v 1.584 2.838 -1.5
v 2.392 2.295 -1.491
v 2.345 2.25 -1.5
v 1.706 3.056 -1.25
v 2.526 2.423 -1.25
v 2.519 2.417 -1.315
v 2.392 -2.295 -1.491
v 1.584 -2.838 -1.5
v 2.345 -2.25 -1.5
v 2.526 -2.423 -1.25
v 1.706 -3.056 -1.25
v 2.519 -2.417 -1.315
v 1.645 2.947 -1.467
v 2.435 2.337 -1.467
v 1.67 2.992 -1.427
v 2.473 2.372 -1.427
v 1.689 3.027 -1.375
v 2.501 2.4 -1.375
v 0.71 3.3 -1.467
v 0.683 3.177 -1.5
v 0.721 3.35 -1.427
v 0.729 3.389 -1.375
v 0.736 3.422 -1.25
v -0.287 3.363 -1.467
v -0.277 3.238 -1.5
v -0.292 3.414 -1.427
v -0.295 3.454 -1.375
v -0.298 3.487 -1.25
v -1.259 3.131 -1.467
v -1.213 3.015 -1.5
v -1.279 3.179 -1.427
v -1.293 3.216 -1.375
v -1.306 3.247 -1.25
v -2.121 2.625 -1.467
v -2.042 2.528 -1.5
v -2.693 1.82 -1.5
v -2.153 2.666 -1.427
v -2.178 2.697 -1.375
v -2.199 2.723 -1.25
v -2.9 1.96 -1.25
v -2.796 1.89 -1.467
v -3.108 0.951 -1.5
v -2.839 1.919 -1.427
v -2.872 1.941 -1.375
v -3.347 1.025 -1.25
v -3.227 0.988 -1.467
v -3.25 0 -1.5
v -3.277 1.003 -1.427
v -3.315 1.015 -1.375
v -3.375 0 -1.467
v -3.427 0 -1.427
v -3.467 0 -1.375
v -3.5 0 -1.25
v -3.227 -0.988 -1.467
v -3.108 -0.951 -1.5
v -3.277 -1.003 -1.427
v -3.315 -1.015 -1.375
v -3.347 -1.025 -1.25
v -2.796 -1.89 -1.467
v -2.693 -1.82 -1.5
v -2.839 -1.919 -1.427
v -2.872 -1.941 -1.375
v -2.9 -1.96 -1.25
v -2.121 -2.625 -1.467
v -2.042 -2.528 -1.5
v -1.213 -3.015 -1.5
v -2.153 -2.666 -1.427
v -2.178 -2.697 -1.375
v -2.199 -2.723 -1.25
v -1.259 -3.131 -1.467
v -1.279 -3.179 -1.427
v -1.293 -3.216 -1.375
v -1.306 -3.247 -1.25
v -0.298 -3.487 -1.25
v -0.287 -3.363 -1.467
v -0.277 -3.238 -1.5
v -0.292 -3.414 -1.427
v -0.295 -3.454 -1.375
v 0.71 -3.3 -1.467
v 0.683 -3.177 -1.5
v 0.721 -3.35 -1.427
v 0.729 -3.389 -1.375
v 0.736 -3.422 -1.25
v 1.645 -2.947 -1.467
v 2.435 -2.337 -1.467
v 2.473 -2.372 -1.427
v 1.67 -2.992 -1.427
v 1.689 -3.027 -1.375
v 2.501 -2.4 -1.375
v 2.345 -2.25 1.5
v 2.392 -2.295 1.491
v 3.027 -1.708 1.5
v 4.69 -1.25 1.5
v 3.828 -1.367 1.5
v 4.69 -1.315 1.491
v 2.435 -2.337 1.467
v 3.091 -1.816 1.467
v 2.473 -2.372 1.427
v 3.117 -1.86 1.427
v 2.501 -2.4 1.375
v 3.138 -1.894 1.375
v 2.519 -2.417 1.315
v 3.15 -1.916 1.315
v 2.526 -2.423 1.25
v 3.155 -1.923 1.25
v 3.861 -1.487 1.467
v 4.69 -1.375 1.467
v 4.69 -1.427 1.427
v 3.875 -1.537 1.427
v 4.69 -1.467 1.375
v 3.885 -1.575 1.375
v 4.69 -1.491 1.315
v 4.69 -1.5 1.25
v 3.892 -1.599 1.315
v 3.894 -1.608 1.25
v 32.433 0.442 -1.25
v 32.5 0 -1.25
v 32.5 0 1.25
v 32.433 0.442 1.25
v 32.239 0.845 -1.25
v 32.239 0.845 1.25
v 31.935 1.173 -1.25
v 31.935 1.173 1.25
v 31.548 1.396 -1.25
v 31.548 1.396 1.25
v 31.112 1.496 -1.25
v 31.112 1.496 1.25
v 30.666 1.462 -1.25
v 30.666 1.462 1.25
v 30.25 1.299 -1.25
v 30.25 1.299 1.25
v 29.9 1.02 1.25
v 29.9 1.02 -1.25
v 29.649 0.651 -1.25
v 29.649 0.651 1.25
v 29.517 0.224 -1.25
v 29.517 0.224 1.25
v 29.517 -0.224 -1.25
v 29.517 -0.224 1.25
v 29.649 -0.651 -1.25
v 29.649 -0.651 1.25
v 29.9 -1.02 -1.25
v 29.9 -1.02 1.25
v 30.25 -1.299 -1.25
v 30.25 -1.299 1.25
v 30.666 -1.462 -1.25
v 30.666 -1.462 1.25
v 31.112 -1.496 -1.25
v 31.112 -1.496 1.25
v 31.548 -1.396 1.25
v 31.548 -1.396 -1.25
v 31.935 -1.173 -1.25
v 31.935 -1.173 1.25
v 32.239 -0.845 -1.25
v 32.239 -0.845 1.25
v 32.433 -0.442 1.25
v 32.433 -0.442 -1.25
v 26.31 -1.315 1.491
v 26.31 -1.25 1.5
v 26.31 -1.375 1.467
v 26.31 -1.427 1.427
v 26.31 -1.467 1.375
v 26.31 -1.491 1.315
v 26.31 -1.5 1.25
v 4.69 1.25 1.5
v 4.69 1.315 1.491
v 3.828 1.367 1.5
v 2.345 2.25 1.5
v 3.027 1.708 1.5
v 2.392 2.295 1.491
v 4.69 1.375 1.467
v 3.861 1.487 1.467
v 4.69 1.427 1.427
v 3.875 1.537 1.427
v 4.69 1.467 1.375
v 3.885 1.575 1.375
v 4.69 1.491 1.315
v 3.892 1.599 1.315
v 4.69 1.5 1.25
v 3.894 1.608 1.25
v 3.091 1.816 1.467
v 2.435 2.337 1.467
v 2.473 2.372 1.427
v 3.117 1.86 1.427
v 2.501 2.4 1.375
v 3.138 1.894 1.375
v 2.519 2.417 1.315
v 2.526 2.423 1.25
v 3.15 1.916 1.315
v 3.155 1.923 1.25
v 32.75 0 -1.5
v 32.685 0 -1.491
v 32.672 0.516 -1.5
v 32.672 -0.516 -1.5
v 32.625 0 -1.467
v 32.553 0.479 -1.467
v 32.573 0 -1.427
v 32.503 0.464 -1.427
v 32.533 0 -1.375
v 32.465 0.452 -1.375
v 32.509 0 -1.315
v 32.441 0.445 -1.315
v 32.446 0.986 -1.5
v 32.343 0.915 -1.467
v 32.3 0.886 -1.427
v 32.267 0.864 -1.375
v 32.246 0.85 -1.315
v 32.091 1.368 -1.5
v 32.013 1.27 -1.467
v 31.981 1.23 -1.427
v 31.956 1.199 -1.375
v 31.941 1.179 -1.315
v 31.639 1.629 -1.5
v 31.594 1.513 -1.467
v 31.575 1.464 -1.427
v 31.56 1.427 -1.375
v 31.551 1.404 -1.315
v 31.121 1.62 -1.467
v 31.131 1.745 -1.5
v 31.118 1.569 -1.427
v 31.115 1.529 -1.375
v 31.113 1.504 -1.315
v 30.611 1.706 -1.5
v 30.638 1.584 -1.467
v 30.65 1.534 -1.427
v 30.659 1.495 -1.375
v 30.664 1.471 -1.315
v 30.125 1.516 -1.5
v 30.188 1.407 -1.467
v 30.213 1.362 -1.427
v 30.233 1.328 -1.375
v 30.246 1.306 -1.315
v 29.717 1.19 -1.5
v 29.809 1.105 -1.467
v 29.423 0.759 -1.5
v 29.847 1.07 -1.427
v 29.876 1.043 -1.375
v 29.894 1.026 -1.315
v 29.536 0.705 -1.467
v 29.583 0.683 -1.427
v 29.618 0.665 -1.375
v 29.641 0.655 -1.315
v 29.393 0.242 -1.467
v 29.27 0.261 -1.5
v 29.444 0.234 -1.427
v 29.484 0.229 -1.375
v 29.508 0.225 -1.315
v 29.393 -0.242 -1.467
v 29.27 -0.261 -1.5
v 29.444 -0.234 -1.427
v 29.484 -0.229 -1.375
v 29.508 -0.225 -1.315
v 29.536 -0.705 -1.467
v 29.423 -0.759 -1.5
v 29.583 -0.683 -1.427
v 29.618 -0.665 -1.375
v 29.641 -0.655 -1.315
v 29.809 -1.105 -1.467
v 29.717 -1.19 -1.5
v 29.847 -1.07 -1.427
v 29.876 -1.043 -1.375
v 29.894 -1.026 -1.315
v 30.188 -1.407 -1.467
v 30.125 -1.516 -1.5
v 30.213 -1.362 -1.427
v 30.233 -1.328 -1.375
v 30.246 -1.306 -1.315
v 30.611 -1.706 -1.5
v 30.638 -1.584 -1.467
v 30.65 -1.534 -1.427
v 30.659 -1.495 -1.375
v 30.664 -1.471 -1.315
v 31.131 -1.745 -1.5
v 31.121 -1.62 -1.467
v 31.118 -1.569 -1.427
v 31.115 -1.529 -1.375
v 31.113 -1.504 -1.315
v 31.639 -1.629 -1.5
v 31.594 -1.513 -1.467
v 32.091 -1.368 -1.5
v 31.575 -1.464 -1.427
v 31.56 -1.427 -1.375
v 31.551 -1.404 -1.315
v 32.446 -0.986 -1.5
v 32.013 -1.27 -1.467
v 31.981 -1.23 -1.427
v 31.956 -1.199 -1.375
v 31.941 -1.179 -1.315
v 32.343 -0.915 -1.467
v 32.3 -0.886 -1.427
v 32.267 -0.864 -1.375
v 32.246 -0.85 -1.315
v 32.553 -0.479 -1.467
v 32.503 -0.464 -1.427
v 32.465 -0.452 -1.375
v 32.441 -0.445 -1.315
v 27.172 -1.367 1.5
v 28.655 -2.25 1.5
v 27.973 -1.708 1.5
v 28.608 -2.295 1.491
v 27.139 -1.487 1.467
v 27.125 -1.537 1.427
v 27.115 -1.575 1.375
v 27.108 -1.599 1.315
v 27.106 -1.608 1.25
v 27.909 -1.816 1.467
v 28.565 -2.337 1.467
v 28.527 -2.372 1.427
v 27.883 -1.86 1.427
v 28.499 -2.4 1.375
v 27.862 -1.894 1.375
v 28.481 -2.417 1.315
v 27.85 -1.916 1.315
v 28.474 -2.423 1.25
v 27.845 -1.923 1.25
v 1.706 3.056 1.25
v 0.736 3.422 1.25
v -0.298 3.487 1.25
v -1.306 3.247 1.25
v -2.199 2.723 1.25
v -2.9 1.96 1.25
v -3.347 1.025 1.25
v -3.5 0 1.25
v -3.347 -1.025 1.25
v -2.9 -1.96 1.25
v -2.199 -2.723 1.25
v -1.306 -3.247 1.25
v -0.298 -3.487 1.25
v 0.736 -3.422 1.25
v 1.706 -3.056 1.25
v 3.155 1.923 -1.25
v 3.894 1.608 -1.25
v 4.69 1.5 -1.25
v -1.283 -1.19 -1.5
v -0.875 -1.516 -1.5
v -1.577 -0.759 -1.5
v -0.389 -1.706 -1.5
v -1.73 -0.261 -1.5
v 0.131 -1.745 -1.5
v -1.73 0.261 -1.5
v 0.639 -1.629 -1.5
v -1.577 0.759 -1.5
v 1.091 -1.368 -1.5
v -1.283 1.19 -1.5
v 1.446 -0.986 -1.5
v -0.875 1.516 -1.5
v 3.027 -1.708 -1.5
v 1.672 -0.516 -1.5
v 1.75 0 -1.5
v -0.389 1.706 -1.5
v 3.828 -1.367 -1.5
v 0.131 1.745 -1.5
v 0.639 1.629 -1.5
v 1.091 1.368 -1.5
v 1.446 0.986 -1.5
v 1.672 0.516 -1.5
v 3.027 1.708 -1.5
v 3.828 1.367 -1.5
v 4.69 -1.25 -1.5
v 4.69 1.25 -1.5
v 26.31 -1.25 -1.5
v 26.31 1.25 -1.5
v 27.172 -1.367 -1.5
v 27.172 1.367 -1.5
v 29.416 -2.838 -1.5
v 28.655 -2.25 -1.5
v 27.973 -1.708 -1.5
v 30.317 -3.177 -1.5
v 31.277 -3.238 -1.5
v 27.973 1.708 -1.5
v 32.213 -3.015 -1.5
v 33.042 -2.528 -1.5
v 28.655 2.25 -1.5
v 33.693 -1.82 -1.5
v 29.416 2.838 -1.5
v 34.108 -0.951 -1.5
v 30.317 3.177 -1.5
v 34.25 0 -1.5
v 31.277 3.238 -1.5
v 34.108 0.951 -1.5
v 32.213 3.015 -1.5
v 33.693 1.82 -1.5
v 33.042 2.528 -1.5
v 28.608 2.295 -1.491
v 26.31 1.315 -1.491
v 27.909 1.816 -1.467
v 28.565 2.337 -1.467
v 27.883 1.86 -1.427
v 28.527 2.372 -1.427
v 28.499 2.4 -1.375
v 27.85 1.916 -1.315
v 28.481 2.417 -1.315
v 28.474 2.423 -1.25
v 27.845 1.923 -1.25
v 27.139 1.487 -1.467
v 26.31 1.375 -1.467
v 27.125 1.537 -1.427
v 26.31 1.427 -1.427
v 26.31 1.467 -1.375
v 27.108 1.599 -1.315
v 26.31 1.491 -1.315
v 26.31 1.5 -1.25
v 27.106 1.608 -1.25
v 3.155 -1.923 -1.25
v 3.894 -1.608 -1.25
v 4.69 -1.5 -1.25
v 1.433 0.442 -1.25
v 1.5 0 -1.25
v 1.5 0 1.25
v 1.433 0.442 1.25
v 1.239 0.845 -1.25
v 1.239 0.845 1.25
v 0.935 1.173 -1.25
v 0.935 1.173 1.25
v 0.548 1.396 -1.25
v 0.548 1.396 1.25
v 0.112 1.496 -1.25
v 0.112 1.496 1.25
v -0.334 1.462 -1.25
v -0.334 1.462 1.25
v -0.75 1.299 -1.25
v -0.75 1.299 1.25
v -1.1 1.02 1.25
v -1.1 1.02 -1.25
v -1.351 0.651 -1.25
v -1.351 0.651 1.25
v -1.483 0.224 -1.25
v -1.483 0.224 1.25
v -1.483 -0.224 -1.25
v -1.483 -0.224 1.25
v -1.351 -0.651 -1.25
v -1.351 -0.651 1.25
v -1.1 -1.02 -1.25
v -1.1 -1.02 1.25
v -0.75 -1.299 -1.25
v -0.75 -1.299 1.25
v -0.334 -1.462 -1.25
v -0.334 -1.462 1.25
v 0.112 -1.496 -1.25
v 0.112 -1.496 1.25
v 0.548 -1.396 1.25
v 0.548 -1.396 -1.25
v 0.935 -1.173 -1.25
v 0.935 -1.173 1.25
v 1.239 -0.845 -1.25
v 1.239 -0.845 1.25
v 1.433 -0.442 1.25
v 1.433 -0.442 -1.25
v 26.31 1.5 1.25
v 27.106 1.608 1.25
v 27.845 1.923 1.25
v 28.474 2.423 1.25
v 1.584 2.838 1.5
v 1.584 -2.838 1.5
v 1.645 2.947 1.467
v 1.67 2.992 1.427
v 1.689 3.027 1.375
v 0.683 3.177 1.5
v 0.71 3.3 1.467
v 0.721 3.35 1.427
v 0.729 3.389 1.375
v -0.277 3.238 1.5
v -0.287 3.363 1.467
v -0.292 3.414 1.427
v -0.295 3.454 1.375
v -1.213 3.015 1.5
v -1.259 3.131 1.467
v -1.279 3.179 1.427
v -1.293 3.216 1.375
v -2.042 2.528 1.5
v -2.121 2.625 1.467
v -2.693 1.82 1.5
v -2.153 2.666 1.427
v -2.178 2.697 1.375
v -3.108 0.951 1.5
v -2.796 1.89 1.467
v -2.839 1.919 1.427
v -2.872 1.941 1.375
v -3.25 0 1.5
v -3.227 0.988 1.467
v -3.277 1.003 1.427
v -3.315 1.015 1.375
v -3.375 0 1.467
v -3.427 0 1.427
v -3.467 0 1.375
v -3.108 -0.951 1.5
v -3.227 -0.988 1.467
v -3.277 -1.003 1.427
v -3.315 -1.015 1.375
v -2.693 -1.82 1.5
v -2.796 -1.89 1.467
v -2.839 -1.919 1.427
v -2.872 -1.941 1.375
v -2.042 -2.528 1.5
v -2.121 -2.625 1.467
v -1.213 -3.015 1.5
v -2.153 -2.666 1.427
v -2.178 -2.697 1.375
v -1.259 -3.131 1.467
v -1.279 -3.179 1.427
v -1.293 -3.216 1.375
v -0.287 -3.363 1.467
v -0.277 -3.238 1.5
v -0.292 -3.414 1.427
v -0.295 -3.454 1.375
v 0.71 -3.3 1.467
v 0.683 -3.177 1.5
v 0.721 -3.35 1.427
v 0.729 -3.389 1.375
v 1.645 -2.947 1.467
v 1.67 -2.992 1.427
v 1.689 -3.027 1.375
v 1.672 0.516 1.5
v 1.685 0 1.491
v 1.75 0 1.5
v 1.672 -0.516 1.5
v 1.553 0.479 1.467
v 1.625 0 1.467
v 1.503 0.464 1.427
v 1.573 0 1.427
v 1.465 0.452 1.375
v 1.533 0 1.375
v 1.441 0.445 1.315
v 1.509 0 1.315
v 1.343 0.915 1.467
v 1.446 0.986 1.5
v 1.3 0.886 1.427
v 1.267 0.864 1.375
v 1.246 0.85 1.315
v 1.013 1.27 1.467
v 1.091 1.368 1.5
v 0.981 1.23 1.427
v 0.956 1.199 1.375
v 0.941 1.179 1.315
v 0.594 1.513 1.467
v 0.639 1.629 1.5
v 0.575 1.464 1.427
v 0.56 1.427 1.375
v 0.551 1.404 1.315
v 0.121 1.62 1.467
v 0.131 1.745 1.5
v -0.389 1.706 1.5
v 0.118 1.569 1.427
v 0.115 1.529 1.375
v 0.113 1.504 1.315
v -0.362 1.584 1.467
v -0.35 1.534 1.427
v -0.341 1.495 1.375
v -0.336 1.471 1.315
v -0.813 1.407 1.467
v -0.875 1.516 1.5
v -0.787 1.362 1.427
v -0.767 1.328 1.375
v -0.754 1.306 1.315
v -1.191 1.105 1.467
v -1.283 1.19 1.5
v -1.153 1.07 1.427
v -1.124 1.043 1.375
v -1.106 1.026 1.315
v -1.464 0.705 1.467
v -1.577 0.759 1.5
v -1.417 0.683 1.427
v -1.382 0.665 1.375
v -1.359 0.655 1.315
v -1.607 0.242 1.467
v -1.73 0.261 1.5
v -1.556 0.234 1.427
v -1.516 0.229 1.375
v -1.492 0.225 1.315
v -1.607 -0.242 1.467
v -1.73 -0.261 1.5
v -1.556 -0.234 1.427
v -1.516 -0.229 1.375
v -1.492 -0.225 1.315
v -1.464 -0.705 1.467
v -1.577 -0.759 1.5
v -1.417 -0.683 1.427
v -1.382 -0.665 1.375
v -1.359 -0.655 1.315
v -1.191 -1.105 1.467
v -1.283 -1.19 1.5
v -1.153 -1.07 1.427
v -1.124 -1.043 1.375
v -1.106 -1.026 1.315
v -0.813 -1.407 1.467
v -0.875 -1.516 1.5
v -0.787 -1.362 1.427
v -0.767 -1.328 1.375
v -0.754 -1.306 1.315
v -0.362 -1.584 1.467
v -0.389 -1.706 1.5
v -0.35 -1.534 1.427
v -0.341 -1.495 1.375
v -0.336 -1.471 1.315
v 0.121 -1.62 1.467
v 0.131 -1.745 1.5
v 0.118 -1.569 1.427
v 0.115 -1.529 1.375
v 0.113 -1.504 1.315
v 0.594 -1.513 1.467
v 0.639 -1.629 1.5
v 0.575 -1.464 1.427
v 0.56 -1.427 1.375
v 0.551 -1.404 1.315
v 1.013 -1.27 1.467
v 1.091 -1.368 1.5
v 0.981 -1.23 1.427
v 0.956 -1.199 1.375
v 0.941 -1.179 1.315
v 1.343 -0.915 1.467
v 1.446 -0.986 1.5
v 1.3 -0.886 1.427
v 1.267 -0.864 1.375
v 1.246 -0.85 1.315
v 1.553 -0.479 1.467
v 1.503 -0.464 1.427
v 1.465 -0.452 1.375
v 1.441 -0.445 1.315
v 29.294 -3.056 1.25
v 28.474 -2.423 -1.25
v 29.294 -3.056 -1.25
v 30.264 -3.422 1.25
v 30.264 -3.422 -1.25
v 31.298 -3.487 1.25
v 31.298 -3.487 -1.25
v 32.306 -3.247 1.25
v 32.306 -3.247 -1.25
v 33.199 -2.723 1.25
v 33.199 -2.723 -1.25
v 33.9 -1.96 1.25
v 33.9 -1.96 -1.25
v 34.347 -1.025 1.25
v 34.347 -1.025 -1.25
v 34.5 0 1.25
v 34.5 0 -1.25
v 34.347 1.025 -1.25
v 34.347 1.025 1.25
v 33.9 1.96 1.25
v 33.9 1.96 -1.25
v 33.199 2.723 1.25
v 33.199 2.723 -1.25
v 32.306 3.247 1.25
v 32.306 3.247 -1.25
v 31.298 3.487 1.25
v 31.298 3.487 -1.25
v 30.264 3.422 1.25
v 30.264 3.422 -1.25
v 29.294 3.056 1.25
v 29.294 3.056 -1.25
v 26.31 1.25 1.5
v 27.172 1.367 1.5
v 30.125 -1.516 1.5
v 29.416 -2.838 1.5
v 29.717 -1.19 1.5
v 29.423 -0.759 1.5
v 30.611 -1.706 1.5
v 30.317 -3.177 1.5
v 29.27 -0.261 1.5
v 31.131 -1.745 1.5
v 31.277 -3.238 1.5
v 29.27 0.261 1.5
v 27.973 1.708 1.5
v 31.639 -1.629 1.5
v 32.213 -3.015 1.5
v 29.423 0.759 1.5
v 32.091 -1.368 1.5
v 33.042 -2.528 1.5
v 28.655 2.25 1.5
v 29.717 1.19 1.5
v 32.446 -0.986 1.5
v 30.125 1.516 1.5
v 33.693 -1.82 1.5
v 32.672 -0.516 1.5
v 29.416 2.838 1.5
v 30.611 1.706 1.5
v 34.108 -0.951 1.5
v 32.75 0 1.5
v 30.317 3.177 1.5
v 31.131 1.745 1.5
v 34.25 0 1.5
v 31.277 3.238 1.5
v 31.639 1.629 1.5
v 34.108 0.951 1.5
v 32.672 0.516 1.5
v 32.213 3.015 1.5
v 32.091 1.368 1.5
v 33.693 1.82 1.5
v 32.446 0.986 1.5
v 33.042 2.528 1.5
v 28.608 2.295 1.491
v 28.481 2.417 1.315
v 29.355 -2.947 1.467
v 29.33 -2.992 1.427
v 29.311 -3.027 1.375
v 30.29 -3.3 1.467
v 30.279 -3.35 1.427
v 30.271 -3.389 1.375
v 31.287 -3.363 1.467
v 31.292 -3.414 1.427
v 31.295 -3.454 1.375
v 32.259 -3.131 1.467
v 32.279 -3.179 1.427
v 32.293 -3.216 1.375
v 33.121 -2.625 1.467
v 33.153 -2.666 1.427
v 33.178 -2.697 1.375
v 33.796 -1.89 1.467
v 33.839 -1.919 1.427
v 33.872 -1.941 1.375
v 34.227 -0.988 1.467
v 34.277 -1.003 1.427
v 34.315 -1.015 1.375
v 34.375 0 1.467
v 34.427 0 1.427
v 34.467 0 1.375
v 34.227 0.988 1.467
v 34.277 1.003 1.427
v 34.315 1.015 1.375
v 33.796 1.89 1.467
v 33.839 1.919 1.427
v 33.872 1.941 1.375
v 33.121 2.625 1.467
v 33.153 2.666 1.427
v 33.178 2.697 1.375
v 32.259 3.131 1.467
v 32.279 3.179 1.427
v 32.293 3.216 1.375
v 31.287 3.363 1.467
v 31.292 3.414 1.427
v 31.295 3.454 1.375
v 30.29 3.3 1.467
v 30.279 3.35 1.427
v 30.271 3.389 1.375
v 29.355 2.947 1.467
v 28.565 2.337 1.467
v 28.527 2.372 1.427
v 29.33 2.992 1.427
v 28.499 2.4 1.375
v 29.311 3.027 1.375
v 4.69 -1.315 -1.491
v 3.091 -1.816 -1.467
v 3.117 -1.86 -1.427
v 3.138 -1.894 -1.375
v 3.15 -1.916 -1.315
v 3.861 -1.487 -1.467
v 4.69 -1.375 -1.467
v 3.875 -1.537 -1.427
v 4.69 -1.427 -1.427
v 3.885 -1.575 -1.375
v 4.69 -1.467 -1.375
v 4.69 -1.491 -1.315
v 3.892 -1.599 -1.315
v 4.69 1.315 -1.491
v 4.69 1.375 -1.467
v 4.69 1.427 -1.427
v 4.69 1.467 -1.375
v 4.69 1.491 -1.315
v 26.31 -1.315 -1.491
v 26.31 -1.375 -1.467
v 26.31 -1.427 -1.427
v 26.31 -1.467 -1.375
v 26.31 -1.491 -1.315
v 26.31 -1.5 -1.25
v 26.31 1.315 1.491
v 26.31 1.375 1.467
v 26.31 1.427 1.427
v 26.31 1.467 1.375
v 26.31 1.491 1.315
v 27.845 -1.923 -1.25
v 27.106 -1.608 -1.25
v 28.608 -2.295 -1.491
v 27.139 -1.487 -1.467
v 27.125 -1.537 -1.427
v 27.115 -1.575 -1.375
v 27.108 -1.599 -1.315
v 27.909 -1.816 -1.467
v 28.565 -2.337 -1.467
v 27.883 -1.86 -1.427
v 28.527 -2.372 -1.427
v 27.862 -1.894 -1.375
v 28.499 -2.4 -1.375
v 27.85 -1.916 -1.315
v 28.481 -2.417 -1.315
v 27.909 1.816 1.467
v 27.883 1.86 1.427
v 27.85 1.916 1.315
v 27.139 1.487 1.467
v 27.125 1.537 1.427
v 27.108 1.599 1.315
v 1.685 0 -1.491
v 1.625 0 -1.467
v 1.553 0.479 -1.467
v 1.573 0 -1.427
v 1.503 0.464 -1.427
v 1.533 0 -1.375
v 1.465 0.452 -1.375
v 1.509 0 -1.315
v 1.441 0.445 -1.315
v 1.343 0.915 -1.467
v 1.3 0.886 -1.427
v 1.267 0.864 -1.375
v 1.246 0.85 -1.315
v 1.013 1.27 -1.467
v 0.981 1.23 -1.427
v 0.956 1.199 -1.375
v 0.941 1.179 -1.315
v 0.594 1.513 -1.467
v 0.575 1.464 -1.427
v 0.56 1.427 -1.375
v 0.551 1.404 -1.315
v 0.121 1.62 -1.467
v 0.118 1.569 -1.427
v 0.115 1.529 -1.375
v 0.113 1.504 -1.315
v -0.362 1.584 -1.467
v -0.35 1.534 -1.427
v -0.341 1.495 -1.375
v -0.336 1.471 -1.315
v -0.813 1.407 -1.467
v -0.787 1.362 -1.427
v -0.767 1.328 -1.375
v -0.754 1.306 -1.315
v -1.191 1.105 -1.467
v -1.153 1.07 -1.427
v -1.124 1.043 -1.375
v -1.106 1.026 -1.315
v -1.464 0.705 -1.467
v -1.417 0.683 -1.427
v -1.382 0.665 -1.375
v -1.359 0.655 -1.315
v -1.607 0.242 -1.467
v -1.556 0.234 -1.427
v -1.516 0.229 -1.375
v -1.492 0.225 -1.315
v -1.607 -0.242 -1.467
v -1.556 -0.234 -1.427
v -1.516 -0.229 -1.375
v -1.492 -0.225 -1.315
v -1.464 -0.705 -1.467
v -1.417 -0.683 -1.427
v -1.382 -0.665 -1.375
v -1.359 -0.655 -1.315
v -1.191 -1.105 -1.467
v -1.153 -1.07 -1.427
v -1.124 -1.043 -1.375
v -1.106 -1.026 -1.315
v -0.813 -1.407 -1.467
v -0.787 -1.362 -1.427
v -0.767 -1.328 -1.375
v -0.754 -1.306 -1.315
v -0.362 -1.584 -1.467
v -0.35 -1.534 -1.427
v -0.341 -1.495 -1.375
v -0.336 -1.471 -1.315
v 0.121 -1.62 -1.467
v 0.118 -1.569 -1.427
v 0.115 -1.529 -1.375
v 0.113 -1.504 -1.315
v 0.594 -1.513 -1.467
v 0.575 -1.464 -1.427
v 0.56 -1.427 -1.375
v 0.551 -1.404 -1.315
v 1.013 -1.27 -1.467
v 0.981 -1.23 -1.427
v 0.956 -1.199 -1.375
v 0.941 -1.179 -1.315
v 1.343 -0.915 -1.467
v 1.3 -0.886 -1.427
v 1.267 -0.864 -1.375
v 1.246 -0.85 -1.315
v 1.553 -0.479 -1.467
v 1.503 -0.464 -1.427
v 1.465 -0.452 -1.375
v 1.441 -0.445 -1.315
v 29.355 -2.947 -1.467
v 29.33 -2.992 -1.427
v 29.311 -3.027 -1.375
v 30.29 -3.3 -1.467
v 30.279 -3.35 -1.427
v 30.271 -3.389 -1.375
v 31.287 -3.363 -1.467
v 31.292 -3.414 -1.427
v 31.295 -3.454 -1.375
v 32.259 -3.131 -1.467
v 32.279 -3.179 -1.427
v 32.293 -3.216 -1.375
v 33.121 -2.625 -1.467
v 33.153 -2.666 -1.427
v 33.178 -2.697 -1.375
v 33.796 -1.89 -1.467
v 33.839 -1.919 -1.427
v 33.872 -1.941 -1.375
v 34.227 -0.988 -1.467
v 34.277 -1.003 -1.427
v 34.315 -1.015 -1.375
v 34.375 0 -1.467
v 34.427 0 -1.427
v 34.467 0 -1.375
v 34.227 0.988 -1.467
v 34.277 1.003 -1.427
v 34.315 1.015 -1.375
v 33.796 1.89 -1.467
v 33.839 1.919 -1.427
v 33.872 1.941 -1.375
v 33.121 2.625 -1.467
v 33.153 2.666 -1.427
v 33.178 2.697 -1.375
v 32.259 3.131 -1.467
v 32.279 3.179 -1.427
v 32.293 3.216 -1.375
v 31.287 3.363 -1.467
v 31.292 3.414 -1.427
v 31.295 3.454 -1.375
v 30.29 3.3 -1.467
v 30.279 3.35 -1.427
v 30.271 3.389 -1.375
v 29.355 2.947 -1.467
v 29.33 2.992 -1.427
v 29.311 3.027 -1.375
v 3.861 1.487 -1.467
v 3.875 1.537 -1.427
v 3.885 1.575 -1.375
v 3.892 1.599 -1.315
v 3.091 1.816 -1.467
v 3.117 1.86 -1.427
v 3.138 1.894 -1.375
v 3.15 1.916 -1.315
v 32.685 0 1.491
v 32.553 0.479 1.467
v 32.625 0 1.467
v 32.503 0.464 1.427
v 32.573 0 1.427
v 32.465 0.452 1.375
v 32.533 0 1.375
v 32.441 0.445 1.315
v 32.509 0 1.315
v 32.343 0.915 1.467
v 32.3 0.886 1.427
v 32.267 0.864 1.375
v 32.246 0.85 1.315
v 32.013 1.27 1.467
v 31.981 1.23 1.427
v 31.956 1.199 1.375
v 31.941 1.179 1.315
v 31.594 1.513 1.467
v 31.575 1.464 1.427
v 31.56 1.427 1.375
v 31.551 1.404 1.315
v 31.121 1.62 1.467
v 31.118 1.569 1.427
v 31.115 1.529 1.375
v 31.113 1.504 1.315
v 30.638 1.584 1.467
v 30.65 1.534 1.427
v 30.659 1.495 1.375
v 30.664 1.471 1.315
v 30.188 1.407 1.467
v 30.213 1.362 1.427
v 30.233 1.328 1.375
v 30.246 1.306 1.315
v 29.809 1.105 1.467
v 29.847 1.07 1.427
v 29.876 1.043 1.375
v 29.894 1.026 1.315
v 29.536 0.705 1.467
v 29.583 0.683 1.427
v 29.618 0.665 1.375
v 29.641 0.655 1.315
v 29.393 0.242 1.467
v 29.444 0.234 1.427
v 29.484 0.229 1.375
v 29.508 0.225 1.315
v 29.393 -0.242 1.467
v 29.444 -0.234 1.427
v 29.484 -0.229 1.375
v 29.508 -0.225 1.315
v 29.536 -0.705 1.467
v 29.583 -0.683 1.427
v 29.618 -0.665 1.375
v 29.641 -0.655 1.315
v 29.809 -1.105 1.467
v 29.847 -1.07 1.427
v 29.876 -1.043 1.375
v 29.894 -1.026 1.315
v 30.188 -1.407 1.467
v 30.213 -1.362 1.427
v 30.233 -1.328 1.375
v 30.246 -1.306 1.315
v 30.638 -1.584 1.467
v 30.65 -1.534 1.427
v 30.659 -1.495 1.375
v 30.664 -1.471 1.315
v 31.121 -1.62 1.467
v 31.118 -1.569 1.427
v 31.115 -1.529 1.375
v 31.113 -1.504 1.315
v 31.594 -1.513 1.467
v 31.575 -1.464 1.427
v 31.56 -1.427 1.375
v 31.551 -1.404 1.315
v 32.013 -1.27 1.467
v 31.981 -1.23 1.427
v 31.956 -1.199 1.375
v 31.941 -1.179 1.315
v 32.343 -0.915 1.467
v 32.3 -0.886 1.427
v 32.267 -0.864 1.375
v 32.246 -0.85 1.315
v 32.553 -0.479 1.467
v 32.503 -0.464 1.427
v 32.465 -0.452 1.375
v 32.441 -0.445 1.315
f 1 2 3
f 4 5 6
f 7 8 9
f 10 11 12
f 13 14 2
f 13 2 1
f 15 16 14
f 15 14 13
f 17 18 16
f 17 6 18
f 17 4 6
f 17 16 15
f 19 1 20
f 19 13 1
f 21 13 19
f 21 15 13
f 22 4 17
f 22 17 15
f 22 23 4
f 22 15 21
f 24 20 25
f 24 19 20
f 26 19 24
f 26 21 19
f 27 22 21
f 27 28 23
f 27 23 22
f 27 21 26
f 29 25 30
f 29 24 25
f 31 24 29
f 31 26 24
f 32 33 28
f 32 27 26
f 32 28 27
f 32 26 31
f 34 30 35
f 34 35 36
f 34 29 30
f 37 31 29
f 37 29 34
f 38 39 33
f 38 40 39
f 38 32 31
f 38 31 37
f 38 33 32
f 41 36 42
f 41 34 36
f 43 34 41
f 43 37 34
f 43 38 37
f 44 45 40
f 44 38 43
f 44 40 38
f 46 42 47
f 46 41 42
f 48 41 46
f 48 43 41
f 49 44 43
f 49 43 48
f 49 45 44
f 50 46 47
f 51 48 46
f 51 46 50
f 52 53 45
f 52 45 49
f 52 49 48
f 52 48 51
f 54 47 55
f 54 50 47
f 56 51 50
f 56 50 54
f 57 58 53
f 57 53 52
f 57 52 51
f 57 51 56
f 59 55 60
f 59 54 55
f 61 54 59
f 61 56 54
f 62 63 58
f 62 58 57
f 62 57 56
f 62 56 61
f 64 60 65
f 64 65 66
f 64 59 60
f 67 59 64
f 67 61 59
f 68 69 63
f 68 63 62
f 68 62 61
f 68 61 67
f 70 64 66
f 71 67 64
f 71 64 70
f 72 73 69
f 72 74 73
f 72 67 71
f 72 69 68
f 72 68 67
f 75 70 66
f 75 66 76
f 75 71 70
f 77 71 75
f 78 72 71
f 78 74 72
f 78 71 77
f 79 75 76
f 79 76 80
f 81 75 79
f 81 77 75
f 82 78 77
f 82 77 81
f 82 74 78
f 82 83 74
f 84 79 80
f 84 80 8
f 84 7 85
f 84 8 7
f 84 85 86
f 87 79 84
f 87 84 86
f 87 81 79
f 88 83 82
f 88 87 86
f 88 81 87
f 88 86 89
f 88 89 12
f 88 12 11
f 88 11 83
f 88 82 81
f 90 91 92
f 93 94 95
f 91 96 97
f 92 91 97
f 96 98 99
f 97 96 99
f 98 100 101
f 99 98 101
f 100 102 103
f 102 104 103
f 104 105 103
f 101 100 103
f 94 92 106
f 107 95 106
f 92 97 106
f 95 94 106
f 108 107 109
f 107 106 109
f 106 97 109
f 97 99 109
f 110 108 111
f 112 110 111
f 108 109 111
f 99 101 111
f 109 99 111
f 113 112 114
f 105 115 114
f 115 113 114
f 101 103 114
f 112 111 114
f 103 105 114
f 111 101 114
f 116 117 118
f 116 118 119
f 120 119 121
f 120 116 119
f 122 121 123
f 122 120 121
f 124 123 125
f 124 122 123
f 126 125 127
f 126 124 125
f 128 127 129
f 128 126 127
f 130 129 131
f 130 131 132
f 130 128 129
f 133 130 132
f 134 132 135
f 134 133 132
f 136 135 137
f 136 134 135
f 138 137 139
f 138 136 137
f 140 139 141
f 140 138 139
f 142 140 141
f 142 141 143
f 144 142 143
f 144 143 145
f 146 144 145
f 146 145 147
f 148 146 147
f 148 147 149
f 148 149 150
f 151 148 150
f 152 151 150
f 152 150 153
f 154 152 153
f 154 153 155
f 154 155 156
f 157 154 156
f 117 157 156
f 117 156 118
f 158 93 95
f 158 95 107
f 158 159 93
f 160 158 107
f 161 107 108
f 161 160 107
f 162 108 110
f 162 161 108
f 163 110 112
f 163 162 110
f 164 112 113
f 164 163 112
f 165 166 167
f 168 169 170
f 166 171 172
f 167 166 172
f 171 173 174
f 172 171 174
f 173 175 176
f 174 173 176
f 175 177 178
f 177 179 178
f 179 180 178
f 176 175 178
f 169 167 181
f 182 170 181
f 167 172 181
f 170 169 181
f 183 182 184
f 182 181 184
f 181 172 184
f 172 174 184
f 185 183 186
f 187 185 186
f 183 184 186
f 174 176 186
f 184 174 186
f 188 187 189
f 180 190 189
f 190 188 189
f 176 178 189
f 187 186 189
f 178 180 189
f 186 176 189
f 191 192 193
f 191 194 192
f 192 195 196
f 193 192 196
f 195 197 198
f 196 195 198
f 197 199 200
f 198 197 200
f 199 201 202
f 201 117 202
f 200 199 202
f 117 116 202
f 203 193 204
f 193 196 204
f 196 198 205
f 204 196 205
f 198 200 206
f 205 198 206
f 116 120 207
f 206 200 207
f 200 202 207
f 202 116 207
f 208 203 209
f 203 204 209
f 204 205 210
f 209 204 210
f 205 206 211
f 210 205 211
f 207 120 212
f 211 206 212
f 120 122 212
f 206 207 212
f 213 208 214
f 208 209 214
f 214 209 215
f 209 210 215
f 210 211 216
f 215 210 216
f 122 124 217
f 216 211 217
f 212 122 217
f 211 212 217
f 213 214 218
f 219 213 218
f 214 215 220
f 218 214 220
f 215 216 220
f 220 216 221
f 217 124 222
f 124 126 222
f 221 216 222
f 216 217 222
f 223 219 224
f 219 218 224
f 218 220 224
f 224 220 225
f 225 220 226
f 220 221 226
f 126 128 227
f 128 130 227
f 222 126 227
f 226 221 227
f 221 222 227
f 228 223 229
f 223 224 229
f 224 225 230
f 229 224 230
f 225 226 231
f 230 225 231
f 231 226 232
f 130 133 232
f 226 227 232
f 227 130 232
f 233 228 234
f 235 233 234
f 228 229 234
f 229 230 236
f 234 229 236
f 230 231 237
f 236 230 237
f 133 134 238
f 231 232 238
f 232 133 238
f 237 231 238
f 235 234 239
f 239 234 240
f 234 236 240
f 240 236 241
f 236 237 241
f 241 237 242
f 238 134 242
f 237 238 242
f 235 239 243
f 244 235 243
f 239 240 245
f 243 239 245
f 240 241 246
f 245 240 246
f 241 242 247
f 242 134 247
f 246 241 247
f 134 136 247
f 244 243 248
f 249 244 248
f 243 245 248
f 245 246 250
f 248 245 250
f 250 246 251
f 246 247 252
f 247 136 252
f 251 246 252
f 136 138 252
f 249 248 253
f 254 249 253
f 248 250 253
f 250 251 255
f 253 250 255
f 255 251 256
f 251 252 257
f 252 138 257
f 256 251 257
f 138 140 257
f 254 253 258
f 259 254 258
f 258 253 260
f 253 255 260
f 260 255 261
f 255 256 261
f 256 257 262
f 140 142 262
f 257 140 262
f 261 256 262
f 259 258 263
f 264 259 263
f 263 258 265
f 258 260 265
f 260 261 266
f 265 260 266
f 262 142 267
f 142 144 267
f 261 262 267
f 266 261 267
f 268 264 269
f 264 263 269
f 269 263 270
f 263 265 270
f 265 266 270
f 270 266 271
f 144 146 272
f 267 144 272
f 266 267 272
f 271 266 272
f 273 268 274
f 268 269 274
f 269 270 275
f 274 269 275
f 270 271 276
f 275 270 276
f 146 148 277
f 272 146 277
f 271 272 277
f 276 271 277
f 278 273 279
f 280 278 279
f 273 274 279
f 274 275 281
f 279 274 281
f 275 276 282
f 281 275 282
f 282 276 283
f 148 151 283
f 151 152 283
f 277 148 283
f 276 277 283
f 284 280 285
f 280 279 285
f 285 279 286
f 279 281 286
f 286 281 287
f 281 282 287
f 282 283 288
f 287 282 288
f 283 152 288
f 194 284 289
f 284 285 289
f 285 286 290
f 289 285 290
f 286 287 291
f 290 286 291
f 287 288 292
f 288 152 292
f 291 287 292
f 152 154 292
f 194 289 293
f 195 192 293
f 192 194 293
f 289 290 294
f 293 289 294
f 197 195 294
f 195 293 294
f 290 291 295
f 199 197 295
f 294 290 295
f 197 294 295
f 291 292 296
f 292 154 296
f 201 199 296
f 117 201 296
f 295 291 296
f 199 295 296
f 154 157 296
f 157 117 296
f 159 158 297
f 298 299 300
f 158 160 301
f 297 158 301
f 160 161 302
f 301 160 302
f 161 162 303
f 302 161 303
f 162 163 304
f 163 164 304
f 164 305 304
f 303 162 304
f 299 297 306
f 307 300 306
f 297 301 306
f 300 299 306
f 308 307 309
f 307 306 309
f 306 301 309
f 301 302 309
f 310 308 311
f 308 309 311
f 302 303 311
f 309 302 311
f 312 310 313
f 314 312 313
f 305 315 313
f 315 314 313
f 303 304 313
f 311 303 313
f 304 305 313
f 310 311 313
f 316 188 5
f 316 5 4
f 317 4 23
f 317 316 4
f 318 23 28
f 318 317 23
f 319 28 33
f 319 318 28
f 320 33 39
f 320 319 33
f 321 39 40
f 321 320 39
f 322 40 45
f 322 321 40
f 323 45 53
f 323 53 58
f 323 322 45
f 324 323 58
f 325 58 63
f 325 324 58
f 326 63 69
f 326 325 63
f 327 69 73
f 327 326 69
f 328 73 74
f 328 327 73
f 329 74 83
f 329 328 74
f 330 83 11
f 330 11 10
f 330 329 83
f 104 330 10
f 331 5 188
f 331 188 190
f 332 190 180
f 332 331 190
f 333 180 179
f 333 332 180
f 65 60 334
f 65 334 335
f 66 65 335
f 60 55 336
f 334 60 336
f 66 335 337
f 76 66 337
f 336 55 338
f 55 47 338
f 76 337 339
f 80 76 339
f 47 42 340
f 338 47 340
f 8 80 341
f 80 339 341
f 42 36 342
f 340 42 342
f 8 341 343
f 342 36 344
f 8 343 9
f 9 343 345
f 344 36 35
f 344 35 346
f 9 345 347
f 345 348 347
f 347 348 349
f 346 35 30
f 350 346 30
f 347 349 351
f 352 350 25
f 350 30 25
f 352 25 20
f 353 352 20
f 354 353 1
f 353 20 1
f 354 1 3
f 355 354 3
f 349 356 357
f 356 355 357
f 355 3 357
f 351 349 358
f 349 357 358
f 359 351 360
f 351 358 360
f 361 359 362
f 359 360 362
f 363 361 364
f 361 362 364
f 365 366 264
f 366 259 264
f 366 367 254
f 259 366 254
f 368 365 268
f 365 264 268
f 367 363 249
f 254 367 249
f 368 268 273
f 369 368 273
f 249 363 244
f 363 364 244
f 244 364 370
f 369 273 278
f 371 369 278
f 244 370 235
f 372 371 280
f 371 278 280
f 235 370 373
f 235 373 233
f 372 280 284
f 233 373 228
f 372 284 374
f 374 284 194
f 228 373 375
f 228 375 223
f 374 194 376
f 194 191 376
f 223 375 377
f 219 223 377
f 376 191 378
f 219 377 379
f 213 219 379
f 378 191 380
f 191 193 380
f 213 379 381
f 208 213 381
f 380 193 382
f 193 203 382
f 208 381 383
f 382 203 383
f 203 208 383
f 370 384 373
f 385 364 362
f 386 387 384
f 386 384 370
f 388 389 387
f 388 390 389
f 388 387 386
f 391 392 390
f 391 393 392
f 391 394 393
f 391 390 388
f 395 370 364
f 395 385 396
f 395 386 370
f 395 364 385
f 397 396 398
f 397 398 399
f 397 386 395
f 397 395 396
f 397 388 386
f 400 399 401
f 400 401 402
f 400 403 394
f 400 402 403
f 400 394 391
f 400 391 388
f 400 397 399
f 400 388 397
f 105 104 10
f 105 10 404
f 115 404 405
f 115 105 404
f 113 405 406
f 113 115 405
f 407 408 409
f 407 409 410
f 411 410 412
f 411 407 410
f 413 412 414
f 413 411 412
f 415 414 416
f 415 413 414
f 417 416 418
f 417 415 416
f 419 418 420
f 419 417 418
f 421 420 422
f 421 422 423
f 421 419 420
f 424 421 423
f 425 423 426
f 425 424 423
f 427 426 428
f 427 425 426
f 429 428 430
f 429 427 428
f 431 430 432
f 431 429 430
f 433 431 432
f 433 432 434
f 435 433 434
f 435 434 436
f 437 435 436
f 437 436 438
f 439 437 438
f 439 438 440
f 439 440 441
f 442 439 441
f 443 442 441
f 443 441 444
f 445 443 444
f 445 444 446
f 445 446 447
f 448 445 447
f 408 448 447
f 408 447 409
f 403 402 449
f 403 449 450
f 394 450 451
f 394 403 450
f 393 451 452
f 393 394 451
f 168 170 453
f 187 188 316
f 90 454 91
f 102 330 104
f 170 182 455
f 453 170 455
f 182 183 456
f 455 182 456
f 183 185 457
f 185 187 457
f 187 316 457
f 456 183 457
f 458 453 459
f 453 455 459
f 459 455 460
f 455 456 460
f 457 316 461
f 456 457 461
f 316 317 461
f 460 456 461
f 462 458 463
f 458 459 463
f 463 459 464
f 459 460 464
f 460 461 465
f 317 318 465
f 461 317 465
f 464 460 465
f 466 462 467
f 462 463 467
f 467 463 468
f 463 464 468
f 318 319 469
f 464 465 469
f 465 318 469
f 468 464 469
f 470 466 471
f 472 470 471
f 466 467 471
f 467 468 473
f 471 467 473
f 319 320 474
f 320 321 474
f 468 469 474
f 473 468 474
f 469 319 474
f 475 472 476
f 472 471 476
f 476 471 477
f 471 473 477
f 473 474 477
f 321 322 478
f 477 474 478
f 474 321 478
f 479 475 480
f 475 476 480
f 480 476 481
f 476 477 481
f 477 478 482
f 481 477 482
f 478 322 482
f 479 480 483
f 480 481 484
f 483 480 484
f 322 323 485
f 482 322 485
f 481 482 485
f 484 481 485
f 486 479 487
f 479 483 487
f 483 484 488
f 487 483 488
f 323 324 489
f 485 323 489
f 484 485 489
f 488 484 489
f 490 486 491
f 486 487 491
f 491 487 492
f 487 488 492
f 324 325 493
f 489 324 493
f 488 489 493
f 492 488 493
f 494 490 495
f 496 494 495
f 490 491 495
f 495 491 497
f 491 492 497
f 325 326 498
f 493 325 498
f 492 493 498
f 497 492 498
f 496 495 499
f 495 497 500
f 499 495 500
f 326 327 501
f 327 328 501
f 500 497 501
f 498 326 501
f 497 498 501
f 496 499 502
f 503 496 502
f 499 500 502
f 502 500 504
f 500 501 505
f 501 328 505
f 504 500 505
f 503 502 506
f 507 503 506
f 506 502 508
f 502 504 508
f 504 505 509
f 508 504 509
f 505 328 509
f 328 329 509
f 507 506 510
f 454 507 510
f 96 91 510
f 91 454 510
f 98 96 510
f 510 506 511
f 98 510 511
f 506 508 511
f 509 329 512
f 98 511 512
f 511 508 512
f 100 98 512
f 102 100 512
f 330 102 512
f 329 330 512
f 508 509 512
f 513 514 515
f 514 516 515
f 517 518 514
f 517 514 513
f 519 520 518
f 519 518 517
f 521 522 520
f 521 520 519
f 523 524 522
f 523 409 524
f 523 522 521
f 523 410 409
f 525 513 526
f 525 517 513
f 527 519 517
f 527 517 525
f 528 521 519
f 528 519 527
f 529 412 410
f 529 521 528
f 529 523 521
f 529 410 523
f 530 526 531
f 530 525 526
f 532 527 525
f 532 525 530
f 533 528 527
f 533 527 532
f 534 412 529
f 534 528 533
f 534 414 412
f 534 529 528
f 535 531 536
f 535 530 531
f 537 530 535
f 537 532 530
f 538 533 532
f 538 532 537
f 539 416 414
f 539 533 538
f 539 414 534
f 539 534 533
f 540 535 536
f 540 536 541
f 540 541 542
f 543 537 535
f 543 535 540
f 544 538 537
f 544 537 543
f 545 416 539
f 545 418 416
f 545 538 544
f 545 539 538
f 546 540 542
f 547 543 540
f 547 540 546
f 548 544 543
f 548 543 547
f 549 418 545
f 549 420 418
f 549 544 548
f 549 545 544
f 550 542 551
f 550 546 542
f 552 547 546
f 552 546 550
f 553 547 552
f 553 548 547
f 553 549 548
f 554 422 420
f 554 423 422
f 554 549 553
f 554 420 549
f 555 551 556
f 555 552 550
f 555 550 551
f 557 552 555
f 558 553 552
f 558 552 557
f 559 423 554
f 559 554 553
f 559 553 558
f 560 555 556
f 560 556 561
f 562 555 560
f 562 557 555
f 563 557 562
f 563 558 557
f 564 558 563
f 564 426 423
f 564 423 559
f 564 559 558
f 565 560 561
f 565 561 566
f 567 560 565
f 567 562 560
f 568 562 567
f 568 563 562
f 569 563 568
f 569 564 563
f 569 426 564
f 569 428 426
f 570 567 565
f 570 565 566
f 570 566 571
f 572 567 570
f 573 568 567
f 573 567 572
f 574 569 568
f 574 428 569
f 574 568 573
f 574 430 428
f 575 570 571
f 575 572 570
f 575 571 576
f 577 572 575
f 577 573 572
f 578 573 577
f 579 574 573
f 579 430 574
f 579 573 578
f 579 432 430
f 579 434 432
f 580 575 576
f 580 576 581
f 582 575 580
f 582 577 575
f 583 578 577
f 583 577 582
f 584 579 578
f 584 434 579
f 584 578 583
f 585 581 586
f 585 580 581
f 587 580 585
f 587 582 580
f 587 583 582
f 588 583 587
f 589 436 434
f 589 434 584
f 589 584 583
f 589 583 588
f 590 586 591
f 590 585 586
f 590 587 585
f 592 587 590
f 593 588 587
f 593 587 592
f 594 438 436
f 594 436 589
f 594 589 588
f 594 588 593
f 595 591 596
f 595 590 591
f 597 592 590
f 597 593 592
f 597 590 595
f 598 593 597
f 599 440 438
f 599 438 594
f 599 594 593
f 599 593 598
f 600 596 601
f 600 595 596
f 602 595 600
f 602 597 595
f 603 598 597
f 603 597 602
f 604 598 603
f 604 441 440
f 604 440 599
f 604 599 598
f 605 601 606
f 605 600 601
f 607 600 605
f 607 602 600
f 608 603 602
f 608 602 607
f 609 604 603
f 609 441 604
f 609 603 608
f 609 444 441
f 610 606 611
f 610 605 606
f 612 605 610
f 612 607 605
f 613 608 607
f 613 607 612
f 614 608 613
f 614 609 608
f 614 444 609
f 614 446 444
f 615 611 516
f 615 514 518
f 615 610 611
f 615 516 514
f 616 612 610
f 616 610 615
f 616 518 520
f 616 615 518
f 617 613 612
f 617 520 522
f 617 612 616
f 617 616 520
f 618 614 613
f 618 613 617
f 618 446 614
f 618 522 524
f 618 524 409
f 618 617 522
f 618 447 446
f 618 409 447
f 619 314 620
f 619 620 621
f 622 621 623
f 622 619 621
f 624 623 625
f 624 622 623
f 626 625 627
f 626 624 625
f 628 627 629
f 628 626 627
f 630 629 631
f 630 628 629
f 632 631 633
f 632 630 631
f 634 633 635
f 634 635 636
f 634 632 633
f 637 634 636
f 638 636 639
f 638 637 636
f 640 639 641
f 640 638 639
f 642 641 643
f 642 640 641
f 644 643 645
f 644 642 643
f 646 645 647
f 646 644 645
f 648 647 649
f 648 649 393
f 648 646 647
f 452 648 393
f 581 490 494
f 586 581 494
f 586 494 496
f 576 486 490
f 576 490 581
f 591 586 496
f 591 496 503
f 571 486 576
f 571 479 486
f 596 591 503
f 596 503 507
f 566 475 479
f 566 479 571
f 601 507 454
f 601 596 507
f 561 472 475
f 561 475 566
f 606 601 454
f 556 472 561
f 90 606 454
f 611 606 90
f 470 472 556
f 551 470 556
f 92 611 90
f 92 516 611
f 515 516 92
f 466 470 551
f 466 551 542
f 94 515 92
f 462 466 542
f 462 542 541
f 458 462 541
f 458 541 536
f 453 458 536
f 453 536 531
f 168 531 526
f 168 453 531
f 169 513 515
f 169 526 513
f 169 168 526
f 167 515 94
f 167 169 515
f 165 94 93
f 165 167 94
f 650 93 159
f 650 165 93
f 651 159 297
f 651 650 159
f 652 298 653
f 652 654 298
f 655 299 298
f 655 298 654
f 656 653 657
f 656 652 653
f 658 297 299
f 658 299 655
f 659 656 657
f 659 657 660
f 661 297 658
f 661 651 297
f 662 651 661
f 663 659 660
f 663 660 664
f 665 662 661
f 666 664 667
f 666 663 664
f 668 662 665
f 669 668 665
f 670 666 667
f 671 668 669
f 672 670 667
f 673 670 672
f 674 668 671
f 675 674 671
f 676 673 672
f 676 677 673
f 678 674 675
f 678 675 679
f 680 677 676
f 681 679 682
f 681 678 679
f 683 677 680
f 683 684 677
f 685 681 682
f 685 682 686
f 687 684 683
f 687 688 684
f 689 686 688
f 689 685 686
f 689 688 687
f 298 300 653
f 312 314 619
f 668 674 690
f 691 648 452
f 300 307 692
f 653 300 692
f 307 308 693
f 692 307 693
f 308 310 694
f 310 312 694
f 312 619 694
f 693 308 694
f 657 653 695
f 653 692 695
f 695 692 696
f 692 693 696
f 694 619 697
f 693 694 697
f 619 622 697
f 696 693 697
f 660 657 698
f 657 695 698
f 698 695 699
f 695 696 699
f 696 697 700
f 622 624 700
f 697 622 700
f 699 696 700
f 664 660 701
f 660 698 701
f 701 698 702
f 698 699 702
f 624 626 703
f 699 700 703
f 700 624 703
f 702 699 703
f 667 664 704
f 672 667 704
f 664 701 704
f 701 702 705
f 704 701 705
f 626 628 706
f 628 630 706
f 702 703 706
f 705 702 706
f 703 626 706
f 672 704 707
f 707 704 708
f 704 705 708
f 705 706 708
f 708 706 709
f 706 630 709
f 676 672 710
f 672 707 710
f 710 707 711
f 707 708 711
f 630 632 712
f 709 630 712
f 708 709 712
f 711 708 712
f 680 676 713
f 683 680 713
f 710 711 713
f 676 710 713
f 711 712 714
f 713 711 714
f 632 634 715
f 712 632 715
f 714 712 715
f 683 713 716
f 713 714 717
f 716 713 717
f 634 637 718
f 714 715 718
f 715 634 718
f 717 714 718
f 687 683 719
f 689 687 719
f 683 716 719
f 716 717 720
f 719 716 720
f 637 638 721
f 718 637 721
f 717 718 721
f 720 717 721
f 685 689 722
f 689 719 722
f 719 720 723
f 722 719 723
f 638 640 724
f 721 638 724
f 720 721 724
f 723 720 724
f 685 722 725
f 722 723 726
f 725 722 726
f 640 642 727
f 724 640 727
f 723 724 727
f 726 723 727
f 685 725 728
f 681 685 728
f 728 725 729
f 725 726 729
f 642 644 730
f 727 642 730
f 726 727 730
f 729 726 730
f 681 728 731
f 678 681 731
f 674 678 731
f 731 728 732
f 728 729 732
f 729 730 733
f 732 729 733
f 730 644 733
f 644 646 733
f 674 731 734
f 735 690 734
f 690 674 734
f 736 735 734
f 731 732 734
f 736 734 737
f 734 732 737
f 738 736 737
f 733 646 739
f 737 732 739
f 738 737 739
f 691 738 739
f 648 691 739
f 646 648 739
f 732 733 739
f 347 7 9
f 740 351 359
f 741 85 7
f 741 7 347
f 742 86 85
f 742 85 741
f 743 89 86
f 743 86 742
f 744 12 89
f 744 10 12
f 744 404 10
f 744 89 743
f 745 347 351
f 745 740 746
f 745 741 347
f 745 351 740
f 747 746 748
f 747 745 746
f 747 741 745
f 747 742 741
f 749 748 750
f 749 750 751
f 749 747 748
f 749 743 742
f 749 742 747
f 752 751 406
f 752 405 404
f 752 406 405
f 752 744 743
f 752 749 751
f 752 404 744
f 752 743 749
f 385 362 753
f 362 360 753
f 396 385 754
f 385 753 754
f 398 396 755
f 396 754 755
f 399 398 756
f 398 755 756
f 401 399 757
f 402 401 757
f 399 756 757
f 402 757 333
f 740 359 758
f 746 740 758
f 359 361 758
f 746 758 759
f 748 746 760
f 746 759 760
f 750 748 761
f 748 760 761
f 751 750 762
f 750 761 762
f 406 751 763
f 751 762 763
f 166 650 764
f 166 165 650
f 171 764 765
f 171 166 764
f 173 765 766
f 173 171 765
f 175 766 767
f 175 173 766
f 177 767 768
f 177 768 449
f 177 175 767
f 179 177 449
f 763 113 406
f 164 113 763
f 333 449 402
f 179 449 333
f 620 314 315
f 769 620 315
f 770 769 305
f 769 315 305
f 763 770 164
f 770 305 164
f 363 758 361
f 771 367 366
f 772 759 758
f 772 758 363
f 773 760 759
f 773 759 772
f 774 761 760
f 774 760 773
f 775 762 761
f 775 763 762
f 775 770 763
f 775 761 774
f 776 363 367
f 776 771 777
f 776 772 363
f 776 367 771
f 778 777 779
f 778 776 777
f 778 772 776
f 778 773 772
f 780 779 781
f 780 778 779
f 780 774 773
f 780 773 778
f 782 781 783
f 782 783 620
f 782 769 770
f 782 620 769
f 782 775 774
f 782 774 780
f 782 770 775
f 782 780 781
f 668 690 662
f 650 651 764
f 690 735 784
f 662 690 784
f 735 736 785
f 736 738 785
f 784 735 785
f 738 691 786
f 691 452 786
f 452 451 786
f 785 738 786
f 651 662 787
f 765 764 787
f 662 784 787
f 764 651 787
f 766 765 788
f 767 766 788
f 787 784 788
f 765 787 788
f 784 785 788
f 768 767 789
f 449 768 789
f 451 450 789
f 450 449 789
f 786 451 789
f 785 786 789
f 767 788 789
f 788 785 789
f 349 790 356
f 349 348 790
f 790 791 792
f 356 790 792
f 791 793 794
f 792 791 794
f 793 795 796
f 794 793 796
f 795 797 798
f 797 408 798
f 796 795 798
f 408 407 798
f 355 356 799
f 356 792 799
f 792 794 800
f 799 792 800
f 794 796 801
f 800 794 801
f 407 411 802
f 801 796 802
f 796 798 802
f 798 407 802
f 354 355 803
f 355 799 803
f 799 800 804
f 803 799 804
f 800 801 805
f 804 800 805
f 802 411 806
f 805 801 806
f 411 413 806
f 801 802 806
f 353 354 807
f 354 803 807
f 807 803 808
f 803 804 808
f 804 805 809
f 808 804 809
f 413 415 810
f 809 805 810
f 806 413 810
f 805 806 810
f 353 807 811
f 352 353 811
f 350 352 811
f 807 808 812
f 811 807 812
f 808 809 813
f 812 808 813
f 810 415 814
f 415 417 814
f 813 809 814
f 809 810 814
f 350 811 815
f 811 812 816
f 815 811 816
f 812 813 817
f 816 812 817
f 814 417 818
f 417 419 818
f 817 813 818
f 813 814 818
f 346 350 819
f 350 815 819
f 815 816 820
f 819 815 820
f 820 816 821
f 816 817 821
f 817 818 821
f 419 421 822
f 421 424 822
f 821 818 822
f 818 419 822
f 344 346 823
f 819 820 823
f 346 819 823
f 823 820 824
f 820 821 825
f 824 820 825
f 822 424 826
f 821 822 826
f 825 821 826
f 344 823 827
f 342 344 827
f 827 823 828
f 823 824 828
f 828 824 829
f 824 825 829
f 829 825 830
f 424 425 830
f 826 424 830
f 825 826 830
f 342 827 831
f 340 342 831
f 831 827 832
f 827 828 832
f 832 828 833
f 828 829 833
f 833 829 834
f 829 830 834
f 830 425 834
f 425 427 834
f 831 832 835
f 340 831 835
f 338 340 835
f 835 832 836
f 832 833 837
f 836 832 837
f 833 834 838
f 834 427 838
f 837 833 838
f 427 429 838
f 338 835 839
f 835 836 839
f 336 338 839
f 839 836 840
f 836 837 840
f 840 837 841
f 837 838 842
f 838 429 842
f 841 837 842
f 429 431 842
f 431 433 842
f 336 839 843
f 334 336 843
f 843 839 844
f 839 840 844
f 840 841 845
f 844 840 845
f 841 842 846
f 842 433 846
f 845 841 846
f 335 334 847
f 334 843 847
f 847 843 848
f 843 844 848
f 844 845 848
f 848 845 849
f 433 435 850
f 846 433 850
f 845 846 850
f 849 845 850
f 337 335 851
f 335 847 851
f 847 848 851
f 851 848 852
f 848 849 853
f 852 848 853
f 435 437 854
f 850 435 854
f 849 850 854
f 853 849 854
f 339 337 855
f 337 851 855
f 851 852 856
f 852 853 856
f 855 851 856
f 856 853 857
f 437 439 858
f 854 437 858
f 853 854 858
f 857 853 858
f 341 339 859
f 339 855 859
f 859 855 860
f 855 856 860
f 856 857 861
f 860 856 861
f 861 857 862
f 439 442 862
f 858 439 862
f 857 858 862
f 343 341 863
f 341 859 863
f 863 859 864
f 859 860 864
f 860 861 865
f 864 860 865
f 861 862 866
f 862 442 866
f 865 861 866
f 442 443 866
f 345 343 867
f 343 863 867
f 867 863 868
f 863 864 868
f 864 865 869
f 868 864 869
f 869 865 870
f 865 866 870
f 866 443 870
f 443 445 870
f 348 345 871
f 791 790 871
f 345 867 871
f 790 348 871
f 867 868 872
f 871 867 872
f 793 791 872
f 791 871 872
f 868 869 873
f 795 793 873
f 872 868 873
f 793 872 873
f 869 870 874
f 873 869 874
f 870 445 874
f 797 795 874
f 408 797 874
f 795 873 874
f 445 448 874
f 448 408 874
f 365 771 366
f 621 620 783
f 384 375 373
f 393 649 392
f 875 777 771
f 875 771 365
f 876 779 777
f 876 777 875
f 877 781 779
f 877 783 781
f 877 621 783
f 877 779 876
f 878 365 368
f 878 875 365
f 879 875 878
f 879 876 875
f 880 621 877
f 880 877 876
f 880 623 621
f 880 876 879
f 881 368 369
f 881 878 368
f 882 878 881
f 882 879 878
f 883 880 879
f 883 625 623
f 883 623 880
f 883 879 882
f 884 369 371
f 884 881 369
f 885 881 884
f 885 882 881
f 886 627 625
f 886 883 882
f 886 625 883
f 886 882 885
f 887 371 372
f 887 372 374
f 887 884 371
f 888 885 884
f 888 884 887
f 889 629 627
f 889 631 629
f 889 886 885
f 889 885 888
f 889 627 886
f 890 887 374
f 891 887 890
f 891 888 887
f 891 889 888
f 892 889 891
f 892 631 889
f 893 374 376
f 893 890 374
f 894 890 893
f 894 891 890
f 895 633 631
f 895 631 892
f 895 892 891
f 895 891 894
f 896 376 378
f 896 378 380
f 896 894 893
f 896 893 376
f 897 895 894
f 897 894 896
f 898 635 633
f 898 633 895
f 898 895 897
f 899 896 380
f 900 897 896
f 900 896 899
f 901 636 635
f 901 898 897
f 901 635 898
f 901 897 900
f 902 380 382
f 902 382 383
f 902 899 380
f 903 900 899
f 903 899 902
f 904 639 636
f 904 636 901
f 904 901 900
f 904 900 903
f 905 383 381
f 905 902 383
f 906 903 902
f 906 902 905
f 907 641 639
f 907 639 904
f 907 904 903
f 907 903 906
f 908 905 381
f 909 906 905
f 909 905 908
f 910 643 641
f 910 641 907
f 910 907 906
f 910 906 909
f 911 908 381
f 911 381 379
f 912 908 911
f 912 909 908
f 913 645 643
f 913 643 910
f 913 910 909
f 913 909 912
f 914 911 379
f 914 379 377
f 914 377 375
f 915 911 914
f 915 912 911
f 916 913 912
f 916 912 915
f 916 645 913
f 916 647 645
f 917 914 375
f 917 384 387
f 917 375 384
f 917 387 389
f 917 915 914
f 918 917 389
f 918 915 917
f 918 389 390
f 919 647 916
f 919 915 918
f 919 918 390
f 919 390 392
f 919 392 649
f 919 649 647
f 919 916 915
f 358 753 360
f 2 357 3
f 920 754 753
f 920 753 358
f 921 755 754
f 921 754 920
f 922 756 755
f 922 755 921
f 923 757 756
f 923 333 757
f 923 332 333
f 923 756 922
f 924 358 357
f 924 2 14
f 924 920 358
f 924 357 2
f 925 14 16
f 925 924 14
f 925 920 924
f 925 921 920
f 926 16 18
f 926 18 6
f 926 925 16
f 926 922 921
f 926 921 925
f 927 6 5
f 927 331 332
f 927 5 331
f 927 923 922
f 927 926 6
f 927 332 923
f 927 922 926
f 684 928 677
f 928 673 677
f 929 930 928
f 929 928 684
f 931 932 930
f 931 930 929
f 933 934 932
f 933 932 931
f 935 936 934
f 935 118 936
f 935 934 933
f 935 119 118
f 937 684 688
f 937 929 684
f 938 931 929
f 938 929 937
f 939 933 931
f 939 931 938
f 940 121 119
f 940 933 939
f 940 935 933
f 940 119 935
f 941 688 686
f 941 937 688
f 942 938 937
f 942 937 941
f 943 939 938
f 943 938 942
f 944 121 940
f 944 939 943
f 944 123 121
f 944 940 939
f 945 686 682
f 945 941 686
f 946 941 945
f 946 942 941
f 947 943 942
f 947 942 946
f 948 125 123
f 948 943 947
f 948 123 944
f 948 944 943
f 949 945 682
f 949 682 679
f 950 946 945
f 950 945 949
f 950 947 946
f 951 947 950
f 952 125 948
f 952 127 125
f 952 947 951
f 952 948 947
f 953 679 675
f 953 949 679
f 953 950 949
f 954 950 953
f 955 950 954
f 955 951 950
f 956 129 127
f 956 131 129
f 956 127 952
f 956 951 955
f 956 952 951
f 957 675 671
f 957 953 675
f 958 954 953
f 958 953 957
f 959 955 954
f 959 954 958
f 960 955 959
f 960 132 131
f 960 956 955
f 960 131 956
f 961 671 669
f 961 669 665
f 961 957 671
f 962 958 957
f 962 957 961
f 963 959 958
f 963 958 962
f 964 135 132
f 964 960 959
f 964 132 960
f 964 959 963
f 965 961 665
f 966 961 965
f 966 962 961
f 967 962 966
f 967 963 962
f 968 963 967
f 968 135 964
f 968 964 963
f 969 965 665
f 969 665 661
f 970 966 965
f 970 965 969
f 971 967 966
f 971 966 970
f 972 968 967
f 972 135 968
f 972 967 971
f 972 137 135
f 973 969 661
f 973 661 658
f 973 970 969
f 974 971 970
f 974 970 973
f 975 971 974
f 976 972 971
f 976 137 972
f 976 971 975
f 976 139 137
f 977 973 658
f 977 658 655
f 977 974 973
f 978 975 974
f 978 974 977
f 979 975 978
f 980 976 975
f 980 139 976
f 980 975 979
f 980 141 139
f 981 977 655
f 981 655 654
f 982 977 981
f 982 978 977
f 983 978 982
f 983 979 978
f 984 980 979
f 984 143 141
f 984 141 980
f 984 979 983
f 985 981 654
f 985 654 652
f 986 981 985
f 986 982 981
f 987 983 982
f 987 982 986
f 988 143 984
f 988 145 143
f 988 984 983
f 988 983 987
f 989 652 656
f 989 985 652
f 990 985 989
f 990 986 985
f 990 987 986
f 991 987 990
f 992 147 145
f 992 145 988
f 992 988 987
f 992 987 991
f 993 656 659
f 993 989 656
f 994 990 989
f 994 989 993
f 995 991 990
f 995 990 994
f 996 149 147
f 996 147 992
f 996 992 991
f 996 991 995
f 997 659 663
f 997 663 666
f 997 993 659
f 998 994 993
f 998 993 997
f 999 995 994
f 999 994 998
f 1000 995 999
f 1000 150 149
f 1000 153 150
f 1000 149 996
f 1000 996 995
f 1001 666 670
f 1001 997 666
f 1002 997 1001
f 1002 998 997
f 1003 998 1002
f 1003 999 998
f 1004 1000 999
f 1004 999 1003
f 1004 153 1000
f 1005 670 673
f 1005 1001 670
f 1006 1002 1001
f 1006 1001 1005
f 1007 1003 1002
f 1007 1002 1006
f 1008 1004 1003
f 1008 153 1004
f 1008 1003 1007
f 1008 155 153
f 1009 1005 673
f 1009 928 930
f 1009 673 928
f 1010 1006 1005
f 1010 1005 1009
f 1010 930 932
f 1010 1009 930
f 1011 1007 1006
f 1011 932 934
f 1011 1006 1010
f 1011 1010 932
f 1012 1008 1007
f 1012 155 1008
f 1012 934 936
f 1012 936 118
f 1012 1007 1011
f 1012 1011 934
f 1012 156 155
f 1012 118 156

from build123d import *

# Parameters (mm, degrees)
SKETCH1_R           = 3.5
SKETCH1_R_2         = 1.5
BOSS_EXTRUDE1_DEPTH = 1.5
FILLET1_R           = 3
FILLET2_R           = 0.25


with BuildPart() as part:
    # Sketch1 → Boss-Extrude1 (new body, symmetric)
    with BuildSketch(Plane.XY):
        Circle(SKETCH1_R)
        Circle(SKETCH1_R_2, mode=Mode.SUBTRACT)
        with Locations((31, 0)):
            Circle(SKETCH1_R)
        with Locations((31, 0)):
            Circle(SKETCH1_R_2, mode=Mode.SUBTRACT)
        with BuildLine():
            Line((3.16227766, -1.5), (27.83772234, -1.5))
            ThreePointArc((27.83772234, -1.5), (27.5, 0), (27.83772234, 1.5))
            Line((27.83772234, 1.5), (3.16227766, 1.5))
            ThreePointArc((3.16227766, 1.5), (3.414525722, 0.768774411), (3.5, 0))
            ThreePointArc((3.5, 0), (3.414525722, -0.768774411), (3.16227766, -1.5))
        make_face()
    extrude(amount=BOSS_EXTRUDE1_DEPTH, both=True)

    # Fillet1
    fillet1_edges = [part.edges().sort_by_distance(p)[0] for p in [
        (3.16227766, 1.5, 0),
        (27.83772234, 1.5, 0),
        (27.83772234, -1.5, 0),
        (3.16227766, -1.5, 0),
    ]]
    fillet(fillet1_edges, radius=FILLET1_R)

    # Fillet2
    fillet2_edges = [part.edges().sort_by_distance(p)[0] for p in [
        (-1.5, 0, -1.5),
        (15.5, 1.5, -1.5),
        (15.5, 1.5, 1.5),
        (34.5, 0, -1.5),
        (34.5, 0, 1.5),
        (15.5, -1.5, -1.5),
        (15.5, -1.5, 1.5),
        (-3.5, 0, -1.5),
        (-3.5, 0, 1.5),
        (27.486281051, 1.740401367, -1.5),
        (27.486281051, 1.740401367, 1.5),
        (27.486281051, -1.740401367, -1.5),
        (29.5, 0, 1.5),
        (27.486281051, -1.740401367, 1.5),
        (3.513718949, -1.740401367, -1.5),
        (3.513718949, -1.740401367, 1.5),
        (3.513718949, 1.740401367, -1.5),
        (3.513718949, 1.740401367, 1.5),
        (-1.5, 0, 1.5),
        (29.5, 0, -1.5),
    ]]
    fillet(fillet2_edges, radius=FILLET2_R)


solid = part.part
